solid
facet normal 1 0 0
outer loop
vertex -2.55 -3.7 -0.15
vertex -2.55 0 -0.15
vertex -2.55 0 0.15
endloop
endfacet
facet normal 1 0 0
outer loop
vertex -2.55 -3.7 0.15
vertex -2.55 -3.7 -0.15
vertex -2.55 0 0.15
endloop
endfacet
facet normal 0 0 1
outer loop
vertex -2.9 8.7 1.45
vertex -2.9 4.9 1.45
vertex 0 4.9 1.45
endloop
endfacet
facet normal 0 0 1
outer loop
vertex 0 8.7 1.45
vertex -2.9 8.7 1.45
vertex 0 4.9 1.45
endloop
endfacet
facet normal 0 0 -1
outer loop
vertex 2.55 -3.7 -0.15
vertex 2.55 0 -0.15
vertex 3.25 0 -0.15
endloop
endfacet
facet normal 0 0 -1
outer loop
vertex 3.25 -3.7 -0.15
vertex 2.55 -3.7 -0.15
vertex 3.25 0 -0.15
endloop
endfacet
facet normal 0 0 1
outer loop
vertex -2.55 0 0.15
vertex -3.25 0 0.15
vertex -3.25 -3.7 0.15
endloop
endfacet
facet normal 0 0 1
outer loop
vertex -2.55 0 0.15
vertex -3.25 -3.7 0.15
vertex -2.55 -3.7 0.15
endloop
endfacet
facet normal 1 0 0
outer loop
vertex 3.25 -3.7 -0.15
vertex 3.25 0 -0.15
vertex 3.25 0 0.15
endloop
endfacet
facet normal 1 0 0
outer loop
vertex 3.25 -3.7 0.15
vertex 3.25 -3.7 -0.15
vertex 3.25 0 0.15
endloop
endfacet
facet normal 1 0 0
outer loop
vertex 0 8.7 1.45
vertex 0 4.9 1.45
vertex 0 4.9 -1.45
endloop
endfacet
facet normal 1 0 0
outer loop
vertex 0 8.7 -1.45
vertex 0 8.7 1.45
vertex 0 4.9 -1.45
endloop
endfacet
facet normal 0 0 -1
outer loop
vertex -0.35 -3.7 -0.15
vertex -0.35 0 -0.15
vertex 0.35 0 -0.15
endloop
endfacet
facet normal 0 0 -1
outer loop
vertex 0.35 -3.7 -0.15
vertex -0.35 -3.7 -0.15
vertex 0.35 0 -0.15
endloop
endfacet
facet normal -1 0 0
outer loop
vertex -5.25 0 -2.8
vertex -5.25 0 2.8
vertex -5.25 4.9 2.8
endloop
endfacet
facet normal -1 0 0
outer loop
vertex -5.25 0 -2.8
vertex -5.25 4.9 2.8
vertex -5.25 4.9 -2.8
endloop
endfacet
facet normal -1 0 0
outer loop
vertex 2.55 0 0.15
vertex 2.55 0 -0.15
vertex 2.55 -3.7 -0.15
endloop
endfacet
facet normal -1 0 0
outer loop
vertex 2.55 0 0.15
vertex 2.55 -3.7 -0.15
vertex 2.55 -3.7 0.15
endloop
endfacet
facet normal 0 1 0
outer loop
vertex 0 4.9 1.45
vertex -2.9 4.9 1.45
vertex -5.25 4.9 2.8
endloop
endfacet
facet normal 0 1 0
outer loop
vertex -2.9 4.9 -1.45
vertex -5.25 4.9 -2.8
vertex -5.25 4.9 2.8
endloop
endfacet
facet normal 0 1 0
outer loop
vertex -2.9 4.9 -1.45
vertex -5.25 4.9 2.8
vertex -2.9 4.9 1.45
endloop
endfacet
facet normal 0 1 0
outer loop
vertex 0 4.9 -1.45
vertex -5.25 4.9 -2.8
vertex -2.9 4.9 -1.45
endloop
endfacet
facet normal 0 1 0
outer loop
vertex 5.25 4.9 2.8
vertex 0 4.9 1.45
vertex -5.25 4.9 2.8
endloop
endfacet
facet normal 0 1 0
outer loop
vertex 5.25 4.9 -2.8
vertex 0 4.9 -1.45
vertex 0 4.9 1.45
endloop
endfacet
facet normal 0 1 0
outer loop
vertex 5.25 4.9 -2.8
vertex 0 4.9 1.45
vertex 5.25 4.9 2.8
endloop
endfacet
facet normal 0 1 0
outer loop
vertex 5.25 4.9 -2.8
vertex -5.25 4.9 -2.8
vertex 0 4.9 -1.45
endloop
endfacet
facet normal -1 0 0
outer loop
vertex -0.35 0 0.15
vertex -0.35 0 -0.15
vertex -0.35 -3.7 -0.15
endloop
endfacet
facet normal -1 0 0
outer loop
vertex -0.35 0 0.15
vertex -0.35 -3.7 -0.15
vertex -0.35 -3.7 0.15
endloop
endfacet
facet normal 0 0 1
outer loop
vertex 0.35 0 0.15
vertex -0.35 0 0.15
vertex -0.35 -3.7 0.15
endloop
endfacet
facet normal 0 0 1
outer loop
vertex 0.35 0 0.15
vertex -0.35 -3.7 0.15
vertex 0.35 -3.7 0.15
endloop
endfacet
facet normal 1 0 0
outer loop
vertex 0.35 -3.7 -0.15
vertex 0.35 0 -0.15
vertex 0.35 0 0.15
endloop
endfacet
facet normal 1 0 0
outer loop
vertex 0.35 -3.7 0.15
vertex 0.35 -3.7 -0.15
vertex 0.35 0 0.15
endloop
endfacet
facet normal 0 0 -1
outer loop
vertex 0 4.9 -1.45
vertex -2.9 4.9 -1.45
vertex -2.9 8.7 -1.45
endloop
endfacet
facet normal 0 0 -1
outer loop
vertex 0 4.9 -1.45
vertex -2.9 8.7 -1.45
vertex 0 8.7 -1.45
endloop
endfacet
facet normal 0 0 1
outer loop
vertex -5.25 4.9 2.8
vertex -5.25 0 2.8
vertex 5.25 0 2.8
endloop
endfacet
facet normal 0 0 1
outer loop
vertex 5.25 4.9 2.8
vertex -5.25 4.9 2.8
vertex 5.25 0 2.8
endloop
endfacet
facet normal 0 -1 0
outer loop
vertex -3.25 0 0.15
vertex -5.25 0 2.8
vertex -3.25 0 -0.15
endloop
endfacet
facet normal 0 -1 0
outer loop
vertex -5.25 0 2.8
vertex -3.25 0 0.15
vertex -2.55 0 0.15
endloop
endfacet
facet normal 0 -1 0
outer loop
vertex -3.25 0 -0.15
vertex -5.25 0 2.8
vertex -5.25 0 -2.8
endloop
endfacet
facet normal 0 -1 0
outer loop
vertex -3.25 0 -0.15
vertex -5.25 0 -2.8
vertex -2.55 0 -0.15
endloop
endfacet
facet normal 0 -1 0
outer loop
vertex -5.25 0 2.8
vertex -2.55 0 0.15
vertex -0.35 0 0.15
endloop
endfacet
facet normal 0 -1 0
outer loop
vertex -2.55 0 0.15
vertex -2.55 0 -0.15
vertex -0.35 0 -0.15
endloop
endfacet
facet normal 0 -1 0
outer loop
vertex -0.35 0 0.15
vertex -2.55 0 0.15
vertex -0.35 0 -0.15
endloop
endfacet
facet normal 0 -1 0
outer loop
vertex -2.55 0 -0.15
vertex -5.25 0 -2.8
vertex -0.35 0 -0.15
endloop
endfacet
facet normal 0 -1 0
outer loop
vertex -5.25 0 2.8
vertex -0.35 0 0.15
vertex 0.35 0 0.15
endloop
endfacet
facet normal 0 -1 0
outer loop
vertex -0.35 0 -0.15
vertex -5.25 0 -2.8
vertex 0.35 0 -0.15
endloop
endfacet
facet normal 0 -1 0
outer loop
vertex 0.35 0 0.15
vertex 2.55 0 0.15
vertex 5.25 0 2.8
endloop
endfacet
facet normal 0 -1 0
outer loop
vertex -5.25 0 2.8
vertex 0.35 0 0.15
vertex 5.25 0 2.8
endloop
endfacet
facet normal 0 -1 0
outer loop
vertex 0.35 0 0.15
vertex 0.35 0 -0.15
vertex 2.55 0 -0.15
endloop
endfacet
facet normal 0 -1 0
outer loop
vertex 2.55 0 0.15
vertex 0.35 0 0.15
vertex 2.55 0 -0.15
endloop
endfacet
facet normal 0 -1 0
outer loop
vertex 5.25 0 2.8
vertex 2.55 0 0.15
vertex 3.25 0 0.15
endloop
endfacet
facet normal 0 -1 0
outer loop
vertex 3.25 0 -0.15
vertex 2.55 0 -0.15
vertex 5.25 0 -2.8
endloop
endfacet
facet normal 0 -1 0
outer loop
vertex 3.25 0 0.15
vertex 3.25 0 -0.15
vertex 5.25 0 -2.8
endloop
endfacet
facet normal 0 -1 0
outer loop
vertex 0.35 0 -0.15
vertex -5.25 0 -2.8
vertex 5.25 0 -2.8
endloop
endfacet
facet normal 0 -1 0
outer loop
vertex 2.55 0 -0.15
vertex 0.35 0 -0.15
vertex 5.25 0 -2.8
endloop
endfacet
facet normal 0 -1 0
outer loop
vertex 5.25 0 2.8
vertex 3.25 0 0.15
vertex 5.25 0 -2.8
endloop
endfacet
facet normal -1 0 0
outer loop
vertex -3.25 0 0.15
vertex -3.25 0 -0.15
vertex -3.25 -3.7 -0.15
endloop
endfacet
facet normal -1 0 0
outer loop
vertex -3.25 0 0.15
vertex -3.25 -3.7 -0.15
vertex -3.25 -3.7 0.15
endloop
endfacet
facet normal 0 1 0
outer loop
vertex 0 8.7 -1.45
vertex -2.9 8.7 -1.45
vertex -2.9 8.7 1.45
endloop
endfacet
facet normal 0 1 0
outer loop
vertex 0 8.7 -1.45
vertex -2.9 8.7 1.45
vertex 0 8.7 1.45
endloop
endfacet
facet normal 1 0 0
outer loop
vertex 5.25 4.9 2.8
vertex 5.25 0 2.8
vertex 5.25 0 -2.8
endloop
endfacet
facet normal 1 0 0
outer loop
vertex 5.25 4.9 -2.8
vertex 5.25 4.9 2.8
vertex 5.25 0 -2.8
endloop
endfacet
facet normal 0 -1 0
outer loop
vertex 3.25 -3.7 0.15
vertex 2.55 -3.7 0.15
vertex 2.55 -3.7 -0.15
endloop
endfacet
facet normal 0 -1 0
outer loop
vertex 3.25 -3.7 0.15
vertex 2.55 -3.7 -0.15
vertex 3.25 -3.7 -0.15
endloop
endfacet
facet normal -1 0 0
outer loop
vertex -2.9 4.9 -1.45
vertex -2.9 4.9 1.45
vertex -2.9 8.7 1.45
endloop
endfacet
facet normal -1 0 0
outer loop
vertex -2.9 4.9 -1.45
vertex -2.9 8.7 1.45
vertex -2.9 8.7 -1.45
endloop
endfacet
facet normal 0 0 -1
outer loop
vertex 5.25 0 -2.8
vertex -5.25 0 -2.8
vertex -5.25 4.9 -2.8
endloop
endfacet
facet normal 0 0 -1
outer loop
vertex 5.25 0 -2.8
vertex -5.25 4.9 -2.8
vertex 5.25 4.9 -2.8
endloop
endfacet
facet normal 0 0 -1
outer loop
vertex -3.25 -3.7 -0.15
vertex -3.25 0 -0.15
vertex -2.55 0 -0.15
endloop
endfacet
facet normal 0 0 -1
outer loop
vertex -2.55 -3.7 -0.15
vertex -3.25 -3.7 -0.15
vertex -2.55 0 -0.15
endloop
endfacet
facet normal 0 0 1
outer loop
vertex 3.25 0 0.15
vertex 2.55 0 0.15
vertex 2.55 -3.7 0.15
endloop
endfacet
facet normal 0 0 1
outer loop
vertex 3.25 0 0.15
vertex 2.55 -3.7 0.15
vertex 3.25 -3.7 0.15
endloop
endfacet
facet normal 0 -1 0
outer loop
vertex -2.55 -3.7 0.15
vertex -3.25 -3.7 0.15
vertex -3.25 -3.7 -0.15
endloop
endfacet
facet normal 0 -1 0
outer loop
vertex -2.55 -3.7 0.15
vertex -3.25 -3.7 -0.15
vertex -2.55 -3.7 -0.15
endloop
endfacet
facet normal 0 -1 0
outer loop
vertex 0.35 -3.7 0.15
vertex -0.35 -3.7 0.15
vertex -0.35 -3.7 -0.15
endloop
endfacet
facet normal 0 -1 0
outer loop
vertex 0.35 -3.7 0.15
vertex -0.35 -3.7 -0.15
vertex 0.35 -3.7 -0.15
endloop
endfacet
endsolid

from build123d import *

# Parameters (mm, degrees)
ESQUISSE1_W        = 10.5
ESQUISSE1_H        = 5.6
BOSS_EXTRU_1_DEPTH = 4.9
ESQUISSE2_W        = 2.9
ESQUISSE2_H        = 2.9
BOSS_EXTRU_2_DEPTH = 3.8
ESQUISSE3_W        = 0.7
ESQUISSE3_H        = 0.3
BOSS_EXTRU_3_DEPTH = 3.7


with BuildPart() as part:
    # Esquisse1 → Boss.-Extru.1 (new body)
    with BuildSketch(Plane(origin=(0, 0, 0), x_dir=(1, 0, 0), z_dir=(0, 1, 0))):
        Rectangle(ESQUISSE1_W, ESQUISSE1_H)
    extrude(amount=BOSS_EXTRU_1_DEPTH)

    # Esquisse2 → Boss.-Extru.2 (add)
    with BuildSketch(Plane(origin=(0, 4.9, 0), x_dir=(1, 0, 0), z_dir=(0, 1, 0))):
        with Locations((-1.45, 0)):
            Rectangle(ESQUISSE2_W, ESQUISSE2_H)
    extrude(amount=BOSS_EXTRU_2_DEPTH)

    # Esquisse3 → Boss.-Extru.3 (add)
    with BuildSketch(Plane.XZ):
        Rectangle(ESQUISSE3_W, ESQUISSE3_H)
        with Locations((2.9, 0)):
            Rectangle(ESQUISSE3_W, ESQUISSE3_H)
        with Locations((-2.9, 0)):
            Rectangle(ESQUISSE3_W, ESQUISSE3_H)
    extrude(amount=BOSS_EXTRU_3_DEPTH)


solid = part.part
